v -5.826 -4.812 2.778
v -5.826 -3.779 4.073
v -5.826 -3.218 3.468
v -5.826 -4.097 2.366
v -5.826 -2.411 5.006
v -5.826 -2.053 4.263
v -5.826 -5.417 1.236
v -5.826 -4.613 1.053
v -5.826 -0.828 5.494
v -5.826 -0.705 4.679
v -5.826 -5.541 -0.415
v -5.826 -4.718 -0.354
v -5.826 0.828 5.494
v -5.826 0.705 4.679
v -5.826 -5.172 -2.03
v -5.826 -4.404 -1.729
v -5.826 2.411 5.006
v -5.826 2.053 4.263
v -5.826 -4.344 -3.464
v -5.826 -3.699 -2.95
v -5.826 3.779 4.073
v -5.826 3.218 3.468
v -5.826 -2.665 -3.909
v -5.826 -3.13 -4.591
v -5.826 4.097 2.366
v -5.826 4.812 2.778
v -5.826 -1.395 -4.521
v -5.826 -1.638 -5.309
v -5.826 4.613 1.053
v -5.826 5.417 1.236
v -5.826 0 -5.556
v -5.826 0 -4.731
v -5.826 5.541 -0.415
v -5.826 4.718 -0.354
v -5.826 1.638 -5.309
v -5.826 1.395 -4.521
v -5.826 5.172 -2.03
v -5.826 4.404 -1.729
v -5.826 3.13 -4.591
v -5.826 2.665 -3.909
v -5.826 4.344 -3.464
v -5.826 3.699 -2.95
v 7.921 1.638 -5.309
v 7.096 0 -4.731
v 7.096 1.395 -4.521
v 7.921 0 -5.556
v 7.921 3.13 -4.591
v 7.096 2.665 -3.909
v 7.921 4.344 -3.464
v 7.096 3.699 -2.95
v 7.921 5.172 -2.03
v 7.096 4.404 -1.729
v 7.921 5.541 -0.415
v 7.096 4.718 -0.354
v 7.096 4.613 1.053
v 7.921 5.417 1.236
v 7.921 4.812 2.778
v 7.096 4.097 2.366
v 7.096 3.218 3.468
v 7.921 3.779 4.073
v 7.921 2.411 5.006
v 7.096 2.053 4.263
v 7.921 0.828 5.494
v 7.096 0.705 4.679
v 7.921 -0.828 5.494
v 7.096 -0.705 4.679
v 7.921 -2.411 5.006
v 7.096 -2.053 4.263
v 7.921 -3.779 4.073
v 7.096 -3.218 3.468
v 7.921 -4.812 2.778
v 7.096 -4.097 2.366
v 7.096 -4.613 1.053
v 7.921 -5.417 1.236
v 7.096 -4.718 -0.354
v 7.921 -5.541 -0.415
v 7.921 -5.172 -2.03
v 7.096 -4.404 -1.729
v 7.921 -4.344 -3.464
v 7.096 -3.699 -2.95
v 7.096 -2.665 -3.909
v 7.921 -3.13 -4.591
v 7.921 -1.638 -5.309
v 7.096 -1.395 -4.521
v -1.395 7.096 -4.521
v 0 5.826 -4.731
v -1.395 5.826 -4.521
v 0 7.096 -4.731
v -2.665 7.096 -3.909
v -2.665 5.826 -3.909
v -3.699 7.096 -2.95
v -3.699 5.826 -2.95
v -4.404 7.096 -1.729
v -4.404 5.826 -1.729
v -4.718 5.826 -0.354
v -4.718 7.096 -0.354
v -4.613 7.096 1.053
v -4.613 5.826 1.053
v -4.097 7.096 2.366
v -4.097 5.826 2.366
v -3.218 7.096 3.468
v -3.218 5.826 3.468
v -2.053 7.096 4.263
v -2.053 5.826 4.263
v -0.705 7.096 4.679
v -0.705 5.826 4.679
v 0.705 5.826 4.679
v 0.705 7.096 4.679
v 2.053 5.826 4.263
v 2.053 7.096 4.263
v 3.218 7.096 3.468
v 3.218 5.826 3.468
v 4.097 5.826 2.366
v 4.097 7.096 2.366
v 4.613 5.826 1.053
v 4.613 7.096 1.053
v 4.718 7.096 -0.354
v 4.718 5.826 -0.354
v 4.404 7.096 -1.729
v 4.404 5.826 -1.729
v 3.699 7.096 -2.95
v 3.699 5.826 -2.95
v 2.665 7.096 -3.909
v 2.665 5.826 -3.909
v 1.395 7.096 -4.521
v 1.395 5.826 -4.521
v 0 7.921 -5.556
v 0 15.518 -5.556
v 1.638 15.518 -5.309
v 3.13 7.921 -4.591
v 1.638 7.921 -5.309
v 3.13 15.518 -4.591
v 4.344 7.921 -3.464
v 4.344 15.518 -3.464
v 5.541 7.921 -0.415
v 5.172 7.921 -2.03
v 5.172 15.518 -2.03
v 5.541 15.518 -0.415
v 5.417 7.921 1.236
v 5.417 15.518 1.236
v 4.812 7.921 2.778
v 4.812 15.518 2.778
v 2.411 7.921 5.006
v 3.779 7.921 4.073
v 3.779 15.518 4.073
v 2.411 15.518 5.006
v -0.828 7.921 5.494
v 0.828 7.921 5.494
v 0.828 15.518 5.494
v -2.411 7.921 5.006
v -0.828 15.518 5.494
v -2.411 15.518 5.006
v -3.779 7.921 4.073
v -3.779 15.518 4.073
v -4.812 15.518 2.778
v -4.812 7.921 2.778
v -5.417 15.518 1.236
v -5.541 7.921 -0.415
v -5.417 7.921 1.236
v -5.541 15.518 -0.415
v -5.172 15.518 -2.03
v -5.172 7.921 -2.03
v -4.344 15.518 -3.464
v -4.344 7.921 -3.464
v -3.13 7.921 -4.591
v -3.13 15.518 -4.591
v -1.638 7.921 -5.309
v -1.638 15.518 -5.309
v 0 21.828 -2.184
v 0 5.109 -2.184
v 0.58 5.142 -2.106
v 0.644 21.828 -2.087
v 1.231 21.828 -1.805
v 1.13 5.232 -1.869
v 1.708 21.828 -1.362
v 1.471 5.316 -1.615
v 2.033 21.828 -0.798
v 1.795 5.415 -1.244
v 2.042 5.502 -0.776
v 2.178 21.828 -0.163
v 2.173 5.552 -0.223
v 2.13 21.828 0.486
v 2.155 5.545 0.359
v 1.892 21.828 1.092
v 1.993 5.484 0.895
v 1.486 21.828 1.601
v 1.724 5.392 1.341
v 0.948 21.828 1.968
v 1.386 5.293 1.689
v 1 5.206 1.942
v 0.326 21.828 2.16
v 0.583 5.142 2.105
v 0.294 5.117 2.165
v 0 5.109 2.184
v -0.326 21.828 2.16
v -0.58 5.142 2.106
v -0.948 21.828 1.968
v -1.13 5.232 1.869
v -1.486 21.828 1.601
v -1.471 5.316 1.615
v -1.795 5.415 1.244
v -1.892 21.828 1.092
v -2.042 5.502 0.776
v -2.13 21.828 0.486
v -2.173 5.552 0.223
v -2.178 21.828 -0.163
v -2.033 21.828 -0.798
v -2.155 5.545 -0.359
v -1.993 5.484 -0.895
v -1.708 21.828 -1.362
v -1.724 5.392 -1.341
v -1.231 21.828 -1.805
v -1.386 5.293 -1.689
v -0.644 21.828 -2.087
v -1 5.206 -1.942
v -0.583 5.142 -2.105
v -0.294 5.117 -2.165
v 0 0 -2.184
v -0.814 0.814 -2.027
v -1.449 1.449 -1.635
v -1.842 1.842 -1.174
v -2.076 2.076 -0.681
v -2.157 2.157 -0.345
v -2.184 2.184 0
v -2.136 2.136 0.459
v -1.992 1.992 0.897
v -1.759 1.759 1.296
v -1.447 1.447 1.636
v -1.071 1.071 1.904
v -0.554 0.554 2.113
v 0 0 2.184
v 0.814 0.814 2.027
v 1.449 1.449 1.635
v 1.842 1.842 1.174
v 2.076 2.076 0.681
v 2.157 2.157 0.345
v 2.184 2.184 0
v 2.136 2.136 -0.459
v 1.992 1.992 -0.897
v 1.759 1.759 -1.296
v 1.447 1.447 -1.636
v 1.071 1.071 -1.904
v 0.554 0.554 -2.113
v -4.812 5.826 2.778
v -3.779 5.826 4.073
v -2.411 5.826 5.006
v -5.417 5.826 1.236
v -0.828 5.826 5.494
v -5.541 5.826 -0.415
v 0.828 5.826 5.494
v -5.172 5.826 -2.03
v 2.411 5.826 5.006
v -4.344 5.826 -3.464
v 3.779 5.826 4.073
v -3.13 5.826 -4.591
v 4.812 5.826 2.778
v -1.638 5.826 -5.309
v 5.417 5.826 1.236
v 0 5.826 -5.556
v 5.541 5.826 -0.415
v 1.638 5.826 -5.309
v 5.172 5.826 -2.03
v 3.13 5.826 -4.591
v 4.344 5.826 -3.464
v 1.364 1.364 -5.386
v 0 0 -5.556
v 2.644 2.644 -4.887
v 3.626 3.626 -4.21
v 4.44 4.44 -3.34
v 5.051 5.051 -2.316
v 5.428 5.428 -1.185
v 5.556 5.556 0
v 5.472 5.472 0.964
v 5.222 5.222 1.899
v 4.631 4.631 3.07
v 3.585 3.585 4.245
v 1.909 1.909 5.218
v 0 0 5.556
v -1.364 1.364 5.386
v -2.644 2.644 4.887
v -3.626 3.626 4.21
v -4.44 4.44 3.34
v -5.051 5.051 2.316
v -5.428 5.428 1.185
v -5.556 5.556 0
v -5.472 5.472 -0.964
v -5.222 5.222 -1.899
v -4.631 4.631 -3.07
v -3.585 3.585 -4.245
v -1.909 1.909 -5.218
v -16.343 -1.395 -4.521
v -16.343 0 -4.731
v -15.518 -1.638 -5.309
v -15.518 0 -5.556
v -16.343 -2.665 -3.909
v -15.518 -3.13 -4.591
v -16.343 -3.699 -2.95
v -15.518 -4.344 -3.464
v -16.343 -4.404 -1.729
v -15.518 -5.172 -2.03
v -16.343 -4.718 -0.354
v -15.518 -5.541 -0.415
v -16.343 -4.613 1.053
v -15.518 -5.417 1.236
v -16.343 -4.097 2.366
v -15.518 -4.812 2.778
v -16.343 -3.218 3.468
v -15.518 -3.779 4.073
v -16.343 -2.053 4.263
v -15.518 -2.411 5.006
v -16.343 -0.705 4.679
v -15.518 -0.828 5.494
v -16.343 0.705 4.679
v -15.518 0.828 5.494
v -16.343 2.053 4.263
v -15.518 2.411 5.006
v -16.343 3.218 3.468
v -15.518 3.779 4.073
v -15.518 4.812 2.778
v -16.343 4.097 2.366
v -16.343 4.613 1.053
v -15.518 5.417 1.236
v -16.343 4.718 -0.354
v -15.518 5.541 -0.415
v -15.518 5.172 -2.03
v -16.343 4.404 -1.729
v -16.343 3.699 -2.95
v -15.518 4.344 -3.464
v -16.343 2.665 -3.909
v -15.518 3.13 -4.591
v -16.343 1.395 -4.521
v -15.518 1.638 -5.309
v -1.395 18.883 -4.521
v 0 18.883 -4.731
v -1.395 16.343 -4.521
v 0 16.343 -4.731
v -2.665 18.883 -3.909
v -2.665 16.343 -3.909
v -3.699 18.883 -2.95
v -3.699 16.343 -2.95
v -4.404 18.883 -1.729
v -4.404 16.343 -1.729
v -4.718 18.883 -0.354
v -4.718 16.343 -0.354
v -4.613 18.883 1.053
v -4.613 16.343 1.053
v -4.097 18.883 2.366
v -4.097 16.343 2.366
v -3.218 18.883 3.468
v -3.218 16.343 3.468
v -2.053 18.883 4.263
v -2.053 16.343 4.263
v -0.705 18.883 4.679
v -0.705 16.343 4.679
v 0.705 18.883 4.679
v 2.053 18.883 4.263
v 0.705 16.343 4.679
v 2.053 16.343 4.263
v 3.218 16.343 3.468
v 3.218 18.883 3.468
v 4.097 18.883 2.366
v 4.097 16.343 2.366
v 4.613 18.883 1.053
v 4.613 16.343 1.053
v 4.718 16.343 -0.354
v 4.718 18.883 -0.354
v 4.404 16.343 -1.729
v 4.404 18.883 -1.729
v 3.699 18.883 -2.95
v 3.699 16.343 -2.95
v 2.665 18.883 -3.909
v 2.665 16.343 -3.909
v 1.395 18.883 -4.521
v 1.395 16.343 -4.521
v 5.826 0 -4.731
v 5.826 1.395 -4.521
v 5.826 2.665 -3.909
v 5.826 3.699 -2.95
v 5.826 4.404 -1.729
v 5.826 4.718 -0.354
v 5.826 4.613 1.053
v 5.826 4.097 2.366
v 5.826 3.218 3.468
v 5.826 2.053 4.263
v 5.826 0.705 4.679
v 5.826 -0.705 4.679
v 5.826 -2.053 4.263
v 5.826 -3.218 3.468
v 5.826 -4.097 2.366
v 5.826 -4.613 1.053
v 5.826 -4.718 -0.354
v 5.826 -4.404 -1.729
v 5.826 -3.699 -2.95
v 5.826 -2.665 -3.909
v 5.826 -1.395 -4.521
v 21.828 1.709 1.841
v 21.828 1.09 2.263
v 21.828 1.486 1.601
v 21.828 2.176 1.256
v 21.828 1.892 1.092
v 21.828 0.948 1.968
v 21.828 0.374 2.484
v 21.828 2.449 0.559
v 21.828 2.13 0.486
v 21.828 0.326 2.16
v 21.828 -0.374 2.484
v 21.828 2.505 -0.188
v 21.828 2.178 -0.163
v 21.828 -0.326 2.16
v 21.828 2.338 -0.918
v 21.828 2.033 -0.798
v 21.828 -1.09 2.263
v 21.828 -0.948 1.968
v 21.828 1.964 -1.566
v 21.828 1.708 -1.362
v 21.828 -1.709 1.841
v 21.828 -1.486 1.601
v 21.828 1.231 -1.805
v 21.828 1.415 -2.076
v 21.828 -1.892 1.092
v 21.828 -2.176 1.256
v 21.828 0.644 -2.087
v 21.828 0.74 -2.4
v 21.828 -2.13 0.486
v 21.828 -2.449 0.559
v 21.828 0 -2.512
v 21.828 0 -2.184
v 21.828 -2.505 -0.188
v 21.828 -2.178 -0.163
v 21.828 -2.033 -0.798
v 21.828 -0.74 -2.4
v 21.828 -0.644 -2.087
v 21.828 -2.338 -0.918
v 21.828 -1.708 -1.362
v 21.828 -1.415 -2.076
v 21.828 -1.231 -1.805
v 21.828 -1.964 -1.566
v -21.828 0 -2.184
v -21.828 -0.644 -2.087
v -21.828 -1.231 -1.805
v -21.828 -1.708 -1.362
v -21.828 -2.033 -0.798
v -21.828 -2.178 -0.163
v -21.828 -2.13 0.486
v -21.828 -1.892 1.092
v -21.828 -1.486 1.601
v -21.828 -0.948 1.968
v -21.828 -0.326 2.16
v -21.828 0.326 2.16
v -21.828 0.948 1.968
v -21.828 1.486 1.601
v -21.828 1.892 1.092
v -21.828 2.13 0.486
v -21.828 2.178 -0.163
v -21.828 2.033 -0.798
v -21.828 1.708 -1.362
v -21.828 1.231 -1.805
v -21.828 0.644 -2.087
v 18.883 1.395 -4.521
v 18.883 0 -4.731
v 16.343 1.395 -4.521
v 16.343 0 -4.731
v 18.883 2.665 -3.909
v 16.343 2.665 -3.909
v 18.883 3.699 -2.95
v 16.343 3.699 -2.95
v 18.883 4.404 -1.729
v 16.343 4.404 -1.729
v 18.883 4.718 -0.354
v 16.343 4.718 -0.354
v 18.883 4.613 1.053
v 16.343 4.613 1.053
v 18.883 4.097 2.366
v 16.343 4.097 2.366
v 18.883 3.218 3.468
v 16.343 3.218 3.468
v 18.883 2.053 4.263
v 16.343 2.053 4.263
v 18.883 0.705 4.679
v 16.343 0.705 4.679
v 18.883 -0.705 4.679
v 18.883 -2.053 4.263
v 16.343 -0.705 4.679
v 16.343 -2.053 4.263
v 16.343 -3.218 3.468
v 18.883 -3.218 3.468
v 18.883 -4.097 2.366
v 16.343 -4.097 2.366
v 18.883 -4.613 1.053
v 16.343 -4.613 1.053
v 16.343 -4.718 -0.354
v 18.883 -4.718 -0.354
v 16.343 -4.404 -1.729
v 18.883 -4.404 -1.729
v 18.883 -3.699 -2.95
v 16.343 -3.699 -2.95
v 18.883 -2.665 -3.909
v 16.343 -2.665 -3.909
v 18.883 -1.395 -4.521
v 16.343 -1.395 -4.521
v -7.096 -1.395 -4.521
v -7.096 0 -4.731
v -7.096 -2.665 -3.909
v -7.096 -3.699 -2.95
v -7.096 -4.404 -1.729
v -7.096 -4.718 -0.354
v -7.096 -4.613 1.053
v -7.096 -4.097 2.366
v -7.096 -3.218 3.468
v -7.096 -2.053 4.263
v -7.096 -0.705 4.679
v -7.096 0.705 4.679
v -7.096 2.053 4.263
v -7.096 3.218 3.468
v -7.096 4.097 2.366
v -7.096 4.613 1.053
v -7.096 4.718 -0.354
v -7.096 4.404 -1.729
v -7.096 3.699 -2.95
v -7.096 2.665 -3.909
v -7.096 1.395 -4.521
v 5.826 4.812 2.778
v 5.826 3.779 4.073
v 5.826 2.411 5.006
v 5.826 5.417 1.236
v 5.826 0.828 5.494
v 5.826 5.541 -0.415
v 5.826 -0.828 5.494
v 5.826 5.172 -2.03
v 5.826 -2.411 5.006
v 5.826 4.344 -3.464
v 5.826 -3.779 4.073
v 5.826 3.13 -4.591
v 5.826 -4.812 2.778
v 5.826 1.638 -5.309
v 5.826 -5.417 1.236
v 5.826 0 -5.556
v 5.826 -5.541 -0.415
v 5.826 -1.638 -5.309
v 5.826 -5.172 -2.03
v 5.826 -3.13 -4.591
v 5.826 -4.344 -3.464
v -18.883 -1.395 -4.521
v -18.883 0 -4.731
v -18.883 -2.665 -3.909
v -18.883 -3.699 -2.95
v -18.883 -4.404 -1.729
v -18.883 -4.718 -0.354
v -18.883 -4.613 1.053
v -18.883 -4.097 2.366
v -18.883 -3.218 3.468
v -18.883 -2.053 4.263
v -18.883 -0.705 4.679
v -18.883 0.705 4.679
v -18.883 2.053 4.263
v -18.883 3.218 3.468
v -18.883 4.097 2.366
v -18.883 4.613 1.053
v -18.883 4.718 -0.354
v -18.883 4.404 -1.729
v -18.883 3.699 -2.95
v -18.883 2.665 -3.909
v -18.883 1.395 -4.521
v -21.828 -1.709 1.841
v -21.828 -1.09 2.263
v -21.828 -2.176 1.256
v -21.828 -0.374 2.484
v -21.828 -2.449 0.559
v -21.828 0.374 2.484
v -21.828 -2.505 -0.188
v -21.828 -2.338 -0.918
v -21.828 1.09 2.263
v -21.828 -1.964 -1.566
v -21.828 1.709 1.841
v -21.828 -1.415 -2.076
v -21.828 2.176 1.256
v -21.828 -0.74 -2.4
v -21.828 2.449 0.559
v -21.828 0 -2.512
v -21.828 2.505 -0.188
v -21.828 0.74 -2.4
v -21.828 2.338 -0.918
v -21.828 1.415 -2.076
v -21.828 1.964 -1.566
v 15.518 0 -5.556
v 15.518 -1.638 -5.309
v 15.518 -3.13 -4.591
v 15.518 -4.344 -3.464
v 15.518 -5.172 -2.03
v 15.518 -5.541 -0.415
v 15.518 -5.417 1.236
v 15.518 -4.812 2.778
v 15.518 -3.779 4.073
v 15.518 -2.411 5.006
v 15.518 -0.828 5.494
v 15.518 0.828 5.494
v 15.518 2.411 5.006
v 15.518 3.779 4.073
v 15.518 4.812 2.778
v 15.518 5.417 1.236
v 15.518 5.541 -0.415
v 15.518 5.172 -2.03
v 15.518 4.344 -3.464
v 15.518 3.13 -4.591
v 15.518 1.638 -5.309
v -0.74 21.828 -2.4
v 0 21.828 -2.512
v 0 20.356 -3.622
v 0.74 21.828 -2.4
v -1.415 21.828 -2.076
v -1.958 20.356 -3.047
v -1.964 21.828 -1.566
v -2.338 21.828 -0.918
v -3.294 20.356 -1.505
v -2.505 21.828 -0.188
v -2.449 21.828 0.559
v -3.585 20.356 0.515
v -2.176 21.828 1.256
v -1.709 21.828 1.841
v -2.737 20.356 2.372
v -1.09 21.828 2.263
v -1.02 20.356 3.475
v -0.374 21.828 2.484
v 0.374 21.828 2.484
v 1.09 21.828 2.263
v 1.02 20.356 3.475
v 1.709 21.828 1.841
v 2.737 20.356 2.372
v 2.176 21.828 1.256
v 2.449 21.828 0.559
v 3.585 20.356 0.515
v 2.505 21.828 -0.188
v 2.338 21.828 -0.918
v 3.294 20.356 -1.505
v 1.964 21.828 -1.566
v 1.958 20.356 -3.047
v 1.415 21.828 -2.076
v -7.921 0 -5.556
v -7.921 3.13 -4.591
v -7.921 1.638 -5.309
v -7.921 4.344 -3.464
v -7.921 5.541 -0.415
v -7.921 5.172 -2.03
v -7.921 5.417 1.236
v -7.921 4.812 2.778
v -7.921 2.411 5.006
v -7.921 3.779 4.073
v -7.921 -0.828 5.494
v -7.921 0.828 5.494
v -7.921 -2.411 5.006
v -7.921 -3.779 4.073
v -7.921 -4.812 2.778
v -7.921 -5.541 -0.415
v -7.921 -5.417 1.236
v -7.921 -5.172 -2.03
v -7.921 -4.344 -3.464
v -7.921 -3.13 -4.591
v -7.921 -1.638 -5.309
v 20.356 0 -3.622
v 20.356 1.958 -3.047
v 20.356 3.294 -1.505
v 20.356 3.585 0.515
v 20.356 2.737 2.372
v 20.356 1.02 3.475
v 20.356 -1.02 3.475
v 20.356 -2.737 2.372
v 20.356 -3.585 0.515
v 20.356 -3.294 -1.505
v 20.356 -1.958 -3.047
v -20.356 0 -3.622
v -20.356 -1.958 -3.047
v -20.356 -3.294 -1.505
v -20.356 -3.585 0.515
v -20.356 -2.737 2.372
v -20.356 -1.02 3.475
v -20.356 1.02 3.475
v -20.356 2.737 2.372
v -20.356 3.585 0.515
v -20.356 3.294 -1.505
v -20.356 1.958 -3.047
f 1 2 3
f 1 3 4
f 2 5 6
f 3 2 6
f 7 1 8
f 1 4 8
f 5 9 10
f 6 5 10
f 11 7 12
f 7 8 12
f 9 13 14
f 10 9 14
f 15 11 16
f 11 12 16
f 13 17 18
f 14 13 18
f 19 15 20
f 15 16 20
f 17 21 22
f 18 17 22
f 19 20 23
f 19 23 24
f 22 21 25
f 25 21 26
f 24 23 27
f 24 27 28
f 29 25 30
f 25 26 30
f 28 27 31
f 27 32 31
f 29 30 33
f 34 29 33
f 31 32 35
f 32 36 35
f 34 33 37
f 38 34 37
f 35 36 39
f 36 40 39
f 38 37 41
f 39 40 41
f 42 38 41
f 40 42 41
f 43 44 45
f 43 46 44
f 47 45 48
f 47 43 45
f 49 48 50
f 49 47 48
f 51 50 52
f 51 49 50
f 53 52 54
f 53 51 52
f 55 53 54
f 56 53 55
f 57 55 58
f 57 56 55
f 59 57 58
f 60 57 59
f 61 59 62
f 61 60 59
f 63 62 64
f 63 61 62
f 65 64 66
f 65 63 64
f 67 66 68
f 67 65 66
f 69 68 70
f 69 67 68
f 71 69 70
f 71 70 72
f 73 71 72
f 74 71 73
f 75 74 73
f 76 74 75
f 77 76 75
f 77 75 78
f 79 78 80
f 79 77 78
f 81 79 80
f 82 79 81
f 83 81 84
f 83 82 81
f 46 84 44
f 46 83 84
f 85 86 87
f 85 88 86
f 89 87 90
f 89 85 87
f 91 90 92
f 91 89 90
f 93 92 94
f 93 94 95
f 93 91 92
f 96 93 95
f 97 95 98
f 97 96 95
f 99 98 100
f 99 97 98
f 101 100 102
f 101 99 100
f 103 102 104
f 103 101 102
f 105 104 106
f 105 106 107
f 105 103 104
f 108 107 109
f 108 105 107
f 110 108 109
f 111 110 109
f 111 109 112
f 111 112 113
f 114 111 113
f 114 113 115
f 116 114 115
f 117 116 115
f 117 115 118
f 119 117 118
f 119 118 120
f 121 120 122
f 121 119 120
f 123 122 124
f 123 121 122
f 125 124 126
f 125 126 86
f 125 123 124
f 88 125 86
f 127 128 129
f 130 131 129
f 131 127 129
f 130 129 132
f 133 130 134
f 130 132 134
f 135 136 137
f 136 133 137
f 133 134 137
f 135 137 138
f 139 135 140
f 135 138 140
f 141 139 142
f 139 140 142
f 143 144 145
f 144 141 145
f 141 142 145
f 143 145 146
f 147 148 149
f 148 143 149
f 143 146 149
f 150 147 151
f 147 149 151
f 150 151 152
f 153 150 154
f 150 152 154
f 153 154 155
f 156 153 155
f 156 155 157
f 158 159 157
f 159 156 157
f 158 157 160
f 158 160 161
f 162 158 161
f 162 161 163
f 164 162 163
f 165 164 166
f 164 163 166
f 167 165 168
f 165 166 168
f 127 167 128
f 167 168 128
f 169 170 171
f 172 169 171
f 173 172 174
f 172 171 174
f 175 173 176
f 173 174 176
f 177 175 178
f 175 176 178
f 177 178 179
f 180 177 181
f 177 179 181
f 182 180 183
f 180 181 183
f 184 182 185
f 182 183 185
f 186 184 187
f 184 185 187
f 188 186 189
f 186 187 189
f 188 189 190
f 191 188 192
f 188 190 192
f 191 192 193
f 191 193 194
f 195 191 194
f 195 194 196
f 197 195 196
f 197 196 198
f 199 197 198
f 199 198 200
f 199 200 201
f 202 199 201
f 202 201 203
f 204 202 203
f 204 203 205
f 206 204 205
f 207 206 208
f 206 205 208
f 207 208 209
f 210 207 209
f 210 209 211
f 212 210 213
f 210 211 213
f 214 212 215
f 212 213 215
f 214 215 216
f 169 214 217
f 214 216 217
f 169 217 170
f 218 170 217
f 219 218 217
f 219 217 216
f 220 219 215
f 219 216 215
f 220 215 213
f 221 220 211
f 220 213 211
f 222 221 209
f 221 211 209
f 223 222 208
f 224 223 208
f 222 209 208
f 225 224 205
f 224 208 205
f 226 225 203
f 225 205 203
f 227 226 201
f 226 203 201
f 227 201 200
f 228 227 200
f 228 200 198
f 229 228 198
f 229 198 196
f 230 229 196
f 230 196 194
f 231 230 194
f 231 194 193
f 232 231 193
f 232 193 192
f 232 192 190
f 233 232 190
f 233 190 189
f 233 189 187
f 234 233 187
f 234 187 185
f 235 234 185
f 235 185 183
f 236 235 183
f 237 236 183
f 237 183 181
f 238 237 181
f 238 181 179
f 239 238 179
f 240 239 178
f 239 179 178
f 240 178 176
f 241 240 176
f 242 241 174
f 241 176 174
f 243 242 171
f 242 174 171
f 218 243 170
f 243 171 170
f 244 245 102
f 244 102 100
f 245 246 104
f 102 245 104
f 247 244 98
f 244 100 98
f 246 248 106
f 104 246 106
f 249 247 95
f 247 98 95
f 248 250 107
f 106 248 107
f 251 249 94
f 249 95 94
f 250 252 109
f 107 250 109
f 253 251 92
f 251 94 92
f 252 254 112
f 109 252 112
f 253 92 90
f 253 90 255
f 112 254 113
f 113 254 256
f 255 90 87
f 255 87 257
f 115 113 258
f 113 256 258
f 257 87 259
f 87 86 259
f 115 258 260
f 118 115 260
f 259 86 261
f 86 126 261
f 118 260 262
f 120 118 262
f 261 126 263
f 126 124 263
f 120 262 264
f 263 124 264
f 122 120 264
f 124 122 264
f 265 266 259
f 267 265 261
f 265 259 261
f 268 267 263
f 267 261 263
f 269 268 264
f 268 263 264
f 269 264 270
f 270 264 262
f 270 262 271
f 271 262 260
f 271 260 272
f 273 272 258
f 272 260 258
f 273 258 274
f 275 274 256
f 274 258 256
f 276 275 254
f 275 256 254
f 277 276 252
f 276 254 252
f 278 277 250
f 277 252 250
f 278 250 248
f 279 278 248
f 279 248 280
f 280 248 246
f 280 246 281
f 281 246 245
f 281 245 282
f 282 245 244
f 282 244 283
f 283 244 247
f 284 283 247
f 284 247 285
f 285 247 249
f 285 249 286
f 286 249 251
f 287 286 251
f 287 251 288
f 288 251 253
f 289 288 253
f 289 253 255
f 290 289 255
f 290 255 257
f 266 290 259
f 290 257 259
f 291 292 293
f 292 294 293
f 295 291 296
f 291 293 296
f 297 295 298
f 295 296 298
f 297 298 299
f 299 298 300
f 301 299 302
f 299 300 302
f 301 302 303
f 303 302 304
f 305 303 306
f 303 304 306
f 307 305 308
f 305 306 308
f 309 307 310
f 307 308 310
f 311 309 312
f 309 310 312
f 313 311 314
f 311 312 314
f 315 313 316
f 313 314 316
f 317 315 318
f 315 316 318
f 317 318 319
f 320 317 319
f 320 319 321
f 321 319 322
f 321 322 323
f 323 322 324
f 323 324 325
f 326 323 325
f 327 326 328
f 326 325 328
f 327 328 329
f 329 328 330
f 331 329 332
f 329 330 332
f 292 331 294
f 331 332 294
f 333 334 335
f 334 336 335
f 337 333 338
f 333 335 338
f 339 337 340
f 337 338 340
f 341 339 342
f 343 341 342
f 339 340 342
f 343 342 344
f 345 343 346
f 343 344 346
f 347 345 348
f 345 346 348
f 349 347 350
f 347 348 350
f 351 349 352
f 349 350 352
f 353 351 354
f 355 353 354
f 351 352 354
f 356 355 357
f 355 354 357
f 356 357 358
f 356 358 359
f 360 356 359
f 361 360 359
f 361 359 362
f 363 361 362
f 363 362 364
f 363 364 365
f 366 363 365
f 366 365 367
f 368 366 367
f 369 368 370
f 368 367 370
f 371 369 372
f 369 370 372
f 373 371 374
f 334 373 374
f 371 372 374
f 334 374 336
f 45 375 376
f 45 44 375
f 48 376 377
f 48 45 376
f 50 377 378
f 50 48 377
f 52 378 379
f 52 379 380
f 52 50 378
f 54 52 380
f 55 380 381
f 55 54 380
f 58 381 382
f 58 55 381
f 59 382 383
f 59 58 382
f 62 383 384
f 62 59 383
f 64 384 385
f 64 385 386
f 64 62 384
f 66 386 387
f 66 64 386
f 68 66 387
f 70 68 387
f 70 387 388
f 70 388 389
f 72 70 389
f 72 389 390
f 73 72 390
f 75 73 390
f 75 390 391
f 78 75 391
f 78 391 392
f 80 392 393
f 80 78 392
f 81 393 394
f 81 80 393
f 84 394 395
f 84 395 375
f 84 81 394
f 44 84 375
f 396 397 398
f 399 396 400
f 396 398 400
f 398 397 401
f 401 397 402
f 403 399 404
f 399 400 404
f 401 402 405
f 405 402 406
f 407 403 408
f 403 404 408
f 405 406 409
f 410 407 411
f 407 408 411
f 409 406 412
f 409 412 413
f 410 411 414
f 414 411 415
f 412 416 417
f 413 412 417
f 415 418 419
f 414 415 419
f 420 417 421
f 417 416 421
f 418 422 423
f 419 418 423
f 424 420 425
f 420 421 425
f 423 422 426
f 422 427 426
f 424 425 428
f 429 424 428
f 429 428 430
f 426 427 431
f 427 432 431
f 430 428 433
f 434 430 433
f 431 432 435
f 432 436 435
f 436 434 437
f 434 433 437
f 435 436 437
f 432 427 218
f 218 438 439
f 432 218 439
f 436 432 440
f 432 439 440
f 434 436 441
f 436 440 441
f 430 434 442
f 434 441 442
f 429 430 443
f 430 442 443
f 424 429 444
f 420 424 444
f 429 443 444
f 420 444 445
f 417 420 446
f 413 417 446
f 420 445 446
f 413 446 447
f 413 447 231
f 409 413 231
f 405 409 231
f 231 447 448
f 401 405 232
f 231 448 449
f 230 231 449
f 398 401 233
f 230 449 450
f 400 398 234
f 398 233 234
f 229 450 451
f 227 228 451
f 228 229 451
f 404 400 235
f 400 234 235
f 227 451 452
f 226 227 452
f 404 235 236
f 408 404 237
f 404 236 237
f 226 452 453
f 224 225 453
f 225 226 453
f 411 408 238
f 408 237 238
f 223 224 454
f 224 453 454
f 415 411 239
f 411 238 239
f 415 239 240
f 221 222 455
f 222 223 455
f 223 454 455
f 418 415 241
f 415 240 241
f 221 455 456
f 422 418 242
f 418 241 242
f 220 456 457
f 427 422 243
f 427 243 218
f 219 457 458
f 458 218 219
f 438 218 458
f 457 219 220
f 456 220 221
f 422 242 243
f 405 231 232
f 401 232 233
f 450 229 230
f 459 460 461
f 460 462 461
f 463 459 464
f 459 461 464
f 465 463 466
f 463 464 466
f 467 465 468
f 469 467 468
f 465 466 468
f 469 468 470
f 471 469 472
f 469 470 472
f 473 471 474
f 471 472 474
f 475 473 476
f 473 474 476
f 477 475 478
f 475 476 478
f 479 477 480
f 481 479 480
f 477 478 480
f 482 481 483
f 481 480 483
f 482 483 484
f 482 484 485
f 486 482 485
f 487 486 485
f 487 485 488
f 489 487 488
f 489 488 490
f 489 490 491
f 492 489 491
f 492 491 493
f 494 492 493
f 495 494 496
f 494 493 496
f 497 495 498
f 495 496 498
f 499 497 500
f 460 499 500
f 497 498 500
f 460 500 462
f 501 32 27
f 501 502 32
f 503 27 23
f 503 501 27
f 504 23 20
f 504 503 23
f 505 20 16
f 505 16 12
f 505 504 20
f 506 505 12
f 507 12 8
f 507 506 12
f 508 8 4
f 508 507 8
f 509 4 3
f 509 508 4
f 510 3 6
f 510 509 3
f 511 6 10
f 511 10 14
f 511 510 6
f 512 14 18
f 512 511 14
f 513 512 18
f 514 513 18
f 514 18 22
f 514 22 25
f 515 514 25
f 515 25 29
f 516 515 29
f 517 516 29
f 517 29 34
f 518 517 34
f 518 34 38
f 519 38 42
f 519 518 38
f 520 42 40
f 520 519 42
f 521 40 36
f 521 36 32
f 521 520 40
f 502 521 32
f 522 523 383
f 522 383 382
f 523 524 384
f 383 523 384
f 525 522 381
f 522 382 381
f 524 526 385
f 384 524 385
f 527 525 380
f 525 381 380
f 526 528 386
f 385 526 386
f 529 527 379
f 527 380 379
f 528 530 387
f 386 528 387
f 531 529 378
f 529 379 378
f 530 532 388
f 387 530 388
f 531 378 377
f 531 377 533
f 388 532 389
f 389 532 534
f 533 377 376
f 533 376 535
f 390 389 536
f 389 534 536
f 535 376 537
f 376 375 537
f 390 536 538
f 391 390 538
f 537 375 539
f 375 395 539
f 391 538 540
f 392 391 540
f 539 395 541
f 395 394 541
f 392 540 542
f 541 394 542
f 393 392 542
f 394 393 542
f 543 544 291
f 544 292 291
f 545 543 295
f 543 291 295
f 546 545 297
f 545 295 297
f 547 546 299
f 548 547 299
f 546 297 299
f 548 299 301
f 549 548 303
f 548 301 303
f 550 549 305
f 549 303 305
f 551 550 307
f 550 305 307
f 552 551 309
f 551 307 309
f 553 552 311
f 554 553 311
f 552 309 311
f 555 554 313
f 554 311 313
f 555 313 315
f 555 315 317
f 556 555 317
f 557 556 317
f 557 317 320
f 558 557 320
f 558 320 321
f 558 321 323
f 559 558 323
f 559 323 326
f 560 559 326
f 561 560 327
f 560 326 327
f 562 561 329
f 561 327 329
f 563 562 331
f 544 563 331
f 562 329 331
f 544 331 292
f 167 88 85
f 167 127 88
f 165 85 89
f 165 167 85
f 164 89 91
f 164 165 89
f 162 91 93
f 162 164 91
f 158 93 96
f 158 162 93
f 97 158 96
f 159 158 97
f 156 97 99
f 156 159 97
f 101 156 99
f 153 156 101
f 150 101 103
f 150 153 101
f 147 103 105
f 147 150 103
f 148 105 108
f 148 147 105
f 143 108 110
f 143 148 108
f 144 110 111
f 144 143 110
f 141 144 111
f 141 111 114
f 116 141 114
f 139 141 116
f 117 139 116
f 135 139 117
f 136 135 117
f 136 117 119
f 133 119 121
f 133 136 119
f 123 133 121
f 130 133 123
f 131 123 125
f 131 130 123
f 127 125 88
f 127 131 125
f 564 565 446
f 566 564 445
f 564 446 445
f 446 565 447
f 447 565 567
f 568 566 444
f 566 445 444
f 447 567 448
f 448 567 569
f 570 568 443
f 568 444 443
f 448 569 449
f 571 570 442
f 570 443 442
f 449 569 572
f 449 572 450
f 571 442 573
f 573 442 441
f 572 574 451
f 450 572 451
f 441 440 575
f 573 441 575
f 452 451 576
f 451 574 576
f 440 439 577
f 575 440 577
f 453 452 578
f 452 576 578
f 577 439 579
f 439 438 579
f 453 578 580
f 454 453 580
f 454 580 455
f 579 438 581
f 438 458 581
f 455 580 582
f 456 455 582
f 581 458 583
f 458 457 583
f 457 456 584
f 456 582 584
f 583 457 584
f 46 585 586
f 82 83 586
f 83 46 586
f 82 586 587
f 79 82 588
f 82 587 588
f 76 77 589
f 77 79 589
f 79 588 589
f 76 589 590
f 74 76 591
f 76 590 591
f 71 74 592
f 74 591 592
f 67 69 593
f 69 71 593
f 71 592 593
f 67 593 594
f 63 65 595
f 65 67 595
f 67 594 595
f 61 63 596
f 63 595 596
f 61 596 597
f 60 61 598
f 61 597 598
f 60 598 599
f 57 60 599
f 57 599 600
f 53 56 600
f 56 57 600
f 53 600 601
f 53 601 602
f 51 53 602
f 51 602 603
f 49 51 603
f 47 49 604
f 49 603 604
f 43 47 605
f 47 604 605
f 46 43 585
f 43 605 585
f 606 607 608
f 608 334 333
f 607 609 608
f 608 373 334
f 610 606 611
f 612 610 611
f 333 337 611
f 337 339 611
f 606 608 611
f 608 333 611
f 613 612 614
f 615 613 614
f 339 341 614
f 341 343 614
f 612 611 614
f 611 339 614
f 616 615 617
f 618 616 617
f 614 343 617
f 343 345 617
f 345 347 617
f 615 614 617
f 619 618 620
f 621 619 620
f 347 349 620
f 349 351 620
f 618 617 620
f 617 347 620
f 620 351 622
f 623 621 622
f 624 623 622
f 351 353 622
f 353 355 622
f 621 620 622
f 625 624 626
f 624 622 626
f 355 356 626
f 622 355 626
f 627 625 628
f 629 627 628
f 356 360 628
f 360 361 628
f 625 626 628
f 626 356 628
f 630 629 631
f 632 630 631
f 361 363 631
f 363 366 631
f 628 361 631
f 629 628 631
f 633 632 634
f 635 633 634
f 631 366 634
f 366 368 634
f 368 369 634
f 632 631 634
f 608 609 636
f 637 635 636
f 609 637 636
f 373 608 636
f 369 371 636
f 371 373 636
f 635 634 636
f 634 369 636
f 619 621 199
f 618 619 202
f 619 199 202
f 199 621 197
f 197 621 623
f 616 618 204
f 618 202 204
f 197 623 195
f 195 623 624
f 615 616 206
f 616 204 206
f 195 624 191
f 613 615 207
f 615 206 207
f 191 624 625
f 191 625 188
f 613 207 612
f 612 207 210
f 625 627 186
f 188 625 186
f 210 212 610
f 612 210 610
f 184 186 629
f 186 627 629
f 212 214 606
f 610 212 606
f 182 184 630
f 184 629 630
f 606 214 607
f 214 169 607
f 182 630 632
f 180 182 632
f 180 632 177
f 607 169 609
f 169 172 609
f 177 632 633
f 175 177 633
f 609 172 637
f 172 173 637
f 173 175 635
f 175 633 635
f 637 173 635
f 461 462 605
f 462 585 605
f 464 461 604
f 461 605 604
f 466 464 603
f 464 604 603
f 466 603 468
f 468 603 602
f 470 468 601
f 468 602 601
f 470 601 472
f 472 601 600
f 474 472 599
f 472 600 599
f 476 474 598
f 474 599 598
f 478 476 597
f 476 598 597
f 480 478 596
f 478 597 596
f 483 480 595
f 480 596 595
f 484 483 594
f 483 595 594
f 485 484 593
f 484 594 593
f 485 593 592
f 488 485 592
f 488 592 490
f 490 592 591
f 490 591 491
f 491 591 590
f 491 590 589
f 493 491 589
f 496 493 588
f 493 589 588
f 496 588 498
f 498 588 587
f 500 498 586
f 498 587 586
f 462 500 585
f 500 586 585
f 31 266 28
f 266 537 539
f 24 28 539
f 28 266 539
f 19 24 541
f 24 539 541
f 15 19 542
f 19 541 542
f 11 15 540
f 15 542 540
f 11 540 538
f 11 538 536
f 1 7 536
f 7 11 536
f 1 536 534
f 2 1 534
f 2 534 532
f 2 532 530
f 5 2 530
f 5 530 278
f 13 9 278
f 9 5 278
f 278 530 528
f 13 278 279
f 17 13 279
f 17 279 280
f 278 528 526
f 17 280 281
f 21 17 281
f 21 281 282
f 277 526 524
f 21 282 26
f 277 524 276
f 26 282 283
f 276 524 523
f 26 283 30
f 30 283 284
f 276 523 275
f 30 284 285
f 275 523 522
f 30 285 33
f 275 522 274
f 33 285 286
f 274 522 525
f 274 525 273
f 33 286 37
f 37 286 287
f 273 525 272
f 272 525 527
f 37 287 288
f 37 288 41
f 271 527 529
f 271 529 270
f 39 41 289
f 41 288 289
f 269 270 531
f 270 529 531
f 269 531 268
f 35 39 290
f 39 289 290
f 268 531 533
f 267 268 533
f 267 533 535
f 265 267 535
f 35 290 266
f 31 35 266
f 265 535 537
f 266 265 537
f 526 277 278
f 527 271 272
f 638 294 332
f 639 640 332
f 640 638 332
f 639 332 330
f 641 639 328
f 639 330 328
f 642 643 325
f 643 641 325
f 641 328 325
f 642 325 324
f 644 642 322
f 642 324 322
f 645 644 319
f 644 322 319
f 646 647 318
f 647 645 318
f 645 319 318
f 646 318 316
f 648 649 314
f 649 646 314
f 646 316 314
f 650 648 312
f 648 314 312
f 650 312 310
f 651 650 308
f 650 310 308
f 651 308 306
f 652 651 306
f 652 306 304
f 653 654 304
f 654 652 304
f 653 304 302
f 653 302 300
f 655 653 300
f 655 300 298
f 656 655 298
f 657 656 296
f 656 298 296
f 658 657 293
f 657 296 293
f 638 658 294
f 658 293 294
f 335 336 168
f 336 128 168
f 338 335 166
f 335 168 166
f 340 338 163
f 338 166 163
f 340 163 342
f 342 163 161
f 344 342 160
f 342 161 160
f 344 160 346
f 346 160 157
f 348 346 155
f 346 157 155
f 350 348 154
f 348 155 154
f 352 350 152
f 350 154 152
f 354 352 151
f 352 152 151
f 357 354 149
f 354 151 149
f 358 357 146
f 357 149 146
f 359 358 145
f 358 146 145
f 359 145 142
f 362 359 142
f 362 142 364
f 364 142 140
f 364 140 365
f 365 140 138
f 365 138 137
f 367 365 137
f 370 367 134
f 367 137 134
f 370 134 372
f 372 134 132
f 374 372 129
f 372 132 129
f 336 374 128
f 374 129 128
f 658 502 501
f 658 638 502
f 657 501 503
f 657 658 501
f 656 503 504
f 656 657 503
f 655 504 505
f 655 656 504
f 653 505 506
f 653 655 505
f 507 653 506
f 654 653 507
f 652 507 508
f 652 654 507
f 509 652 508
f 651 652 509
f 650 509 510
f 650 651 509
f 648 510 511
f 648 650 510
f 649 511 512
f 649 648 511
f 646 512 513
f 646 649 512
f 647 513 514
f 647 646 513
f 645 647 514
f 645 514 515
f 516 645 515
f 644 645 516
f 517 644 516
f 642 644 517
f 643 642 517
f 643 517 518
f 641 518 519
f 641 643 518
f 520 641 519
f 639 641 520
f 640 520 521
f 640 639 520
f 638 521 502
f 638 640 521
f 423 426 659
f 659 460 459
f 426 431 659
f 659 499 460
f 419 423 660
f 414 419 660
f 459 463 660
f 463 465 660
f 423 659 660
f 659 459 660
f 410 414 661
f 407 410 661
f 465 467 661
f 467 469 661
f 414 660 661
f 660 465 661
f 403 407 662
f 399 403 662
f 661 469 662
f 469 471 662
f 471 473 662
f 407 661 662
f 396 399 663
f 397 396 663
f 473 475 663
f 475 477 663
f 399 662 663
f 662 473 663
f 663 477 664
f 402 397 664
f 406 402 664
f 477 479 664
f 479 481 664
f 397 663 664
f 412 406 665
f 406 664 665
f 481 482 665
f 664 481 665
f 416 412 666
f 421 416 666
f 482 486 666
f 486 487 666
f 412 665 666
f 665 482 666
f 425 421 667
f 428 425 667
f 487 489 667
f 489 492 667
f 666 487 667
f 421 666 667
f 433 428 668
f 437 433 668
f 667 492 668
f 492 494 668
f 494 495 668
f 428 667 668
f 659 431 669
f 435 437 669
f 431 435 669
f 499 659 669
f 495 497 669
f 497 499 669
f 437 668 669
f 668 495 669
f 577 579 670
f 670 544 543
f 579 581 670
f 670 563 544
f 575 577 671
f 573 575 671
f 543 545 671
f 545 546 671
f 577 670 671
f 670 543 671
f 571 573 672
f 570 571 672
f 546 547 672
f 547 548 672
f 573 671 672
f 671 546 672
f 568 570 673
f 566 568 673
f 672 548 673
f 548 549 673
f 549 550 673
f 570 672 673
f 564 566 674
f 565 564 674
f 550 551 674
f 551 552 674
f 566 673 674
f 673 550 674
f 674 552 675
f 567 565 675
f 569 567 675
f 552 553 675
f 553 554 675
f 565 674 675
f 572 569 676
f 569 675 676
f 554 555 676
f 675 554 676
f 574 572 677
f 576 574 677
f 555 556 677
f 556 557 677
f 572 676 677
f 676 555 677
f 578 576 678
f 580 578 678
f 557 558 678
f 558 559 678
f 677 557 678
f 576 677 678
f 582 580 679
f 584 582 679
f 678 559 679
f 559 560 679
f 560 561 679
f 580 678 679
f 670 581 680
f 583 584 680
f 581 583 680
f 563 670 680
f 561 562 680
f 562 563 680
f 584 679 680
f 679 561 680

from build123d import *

# Parameters (mm, degrees)
SKETCH2_R           = 5.55625
EXTRUDE1_DEPTH      = 16.002
SKETCH15_R          = 5.55625
BOSS_EXTRUDE1_DEPTH = 5.826125
SKETCH16_R          = 2.1844
CUT_EXTRUDE1_DEPTH  = 24.199372171
CIRPATTERN1_COUNT   = 3
CIRPATTERN1_ANGLE   = 180
SKETCH17_R          = 2.1844
CUT_EXTRUDE2_DEPTH  = 50.124404517
CUT_EXTRUDE3_REACH  = 37.458
SKETCH18_R          = 2.1844


with BuildPart() as part:
    # Sketch2 → Extrude1 (new body)
    with BuildSketch(Plane(origin=(-21.828125, 0, 0), x_dir=(0, 0, -1), z_dir=(1, 0, 0))):
        Circle(SKETCH2_R)
    extrude(amount=EXTRUDE1_DEPTH)

    # Sketch5 → Cut-Revolve1 (revolve, cut)
    with BuildSketch(Plane.XY, mode=Mode.PRIVATE) as cut_revolve1_sk:
        Polygon((-18.883013362, 4.731360803), (-16.343013362, 4.731360803), (-15.518124165, 5.55625), (-21.828125, 5.55625), (-21.828125, 2.51206), align=None)
        Polygon((-5.826125, 4.731360803), (-7.096125, 4.731360803), (-7.921014197, 5.55625), (-5.826125, 5.55625), align=None)
    revolve(cut_revolve1_sk.sketch.rotate(Axis((0, 0, 0), (-1, 0, 0)), 90), axis=Axis((0, 0, 0), (-1, 0, 0)), mode=Mode.SUBTRACT)

    # Sketch15 → Boss-Extrude1 (add)
    with BuildSketch(Plane(origin=(-5.826125, 0, 0), x_dir=(0, 0, -1), z_dir=(1, 0, 0))):
        Circle(SKETCH15_R)
    extrude(amount=BOSS_EXTRUDE1_DEPTH)

    # Sketch16 → Cut-Extrude1 (cut, through all)
    with BuildSketch(Plane(origin=(0, 0, 0), x_dir=(0, 0, -1), z_dir=(1, 0, 0))):
        Circle(SKETCH16_R)
    extrude(amount=-CUT_EXTRUDE1_DEPTH, mode=Mode.SUBTRACT)


with BuildPart() as cirpattern1_1:
    # CirPattern1: pattern copy
    add(part.part.rotate(Axis((0, 0, 0), (0, 0, -1)), 1 * CIRPATTERN1_ANGLE / (CIRPATTERN1_COUNT - 1)))

    # Sketch17 → Cut-Extrude2 (cut, through all)
    with BuildSketch(Plane.ZY.offset(21.828125)):
        with Locations(Location((0, 0, 0), (0, 0, 180))):
            Circle(SKETCH17_R)
    extrude(amount=-CUT_EXTRUDE2_DEPTH, mode=Mode.SUBTRACT)


with BuildPart() as cirpattern1_2:
    # CirPattern1: pattern copy
    add(part.part.rotate(Axis((0, 0, 0), (0, 0, -1)), 2 * CIRPATTERN1_ANGLE / (CIRPATTERN1_COUNT - 1)))


with BuildPart() as cirpattern1_1_1:
    add(cirpattern1_1.part)

    # Combine1: union part, CirPattern1_2
    add(part.part)
    add(cirpattern1_2.part)

    # Sketch18 → Cut-Extrude3 (cut, up to next)
    with BuildSketch(Plane(origin=(0, 21.828125, 0), x_dir=(1, 0, 0), z_dir=(0, 1, 0)), mode=Mode.PRIVATE) as cut_extrude3_sk1:
        with Locations(Location((0, 0, 0), (0, 0, 90))):
            Circle(SKETCH18_R)
    cut_extrude3_tool1 = extrude(cut_extrude3_sk1.sketch, amount=-CUT_EXTRUDE3_REACH, mode=Mode.PRIVATE) & cirpattern1_1_1.part
    add(cut_extrude3_tool1.solids().sort_by_distance((0, 21.828125, 0))[0], mode=Mode.SUBTRACT)


solid = cirpattern1_1_1.part
